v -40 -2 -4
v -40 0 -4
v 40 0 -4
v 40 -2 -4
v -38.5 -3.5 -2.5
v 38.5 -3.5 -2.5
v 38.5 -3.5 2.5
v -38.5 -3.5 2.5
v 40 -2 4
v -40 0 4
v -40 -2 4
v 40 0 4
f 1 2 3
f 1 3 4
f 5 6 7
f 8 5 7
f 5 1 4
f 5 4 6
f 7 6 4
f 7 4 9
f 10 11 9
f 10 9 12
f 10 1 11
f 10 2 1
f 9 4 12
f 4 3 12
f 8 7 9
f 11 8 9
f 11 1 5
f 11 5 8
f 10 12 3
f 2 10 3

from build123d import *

# Parameters (mm, degrees)
BOSS_EXTRU_1_DEPTH      = 40
BOSS_EXTRU_1_DEPTH_BACK = 40
CHANFREIN1_SIZE         = 1.5


with BuildPart() as part:
    # Esquisse1 → Boss.-Extru.1 (new, two sides: drawn at the far end of the back side and taken through both)
    with BuildSketch(Plane(origin=(0, 0, 0), x_dir=(0, 0, -1), z_dir=(1, 0, 0)).offset(-BOSS_EXTRU_1_DEPTH_BACK)):
        Polygon((-4, 0), (4, 0), (4, -2), (2.5, -3.5), (-2.5, -3.5), (-4, -2), align=None)
    extrude(amount=BOSS_EXTRU_1_DEPTH + BOSS_EXTRU_1_DEPTH_BACK)

    # Chanfrein1
    chanfrein1_edges = [part.edges().sort_by_distance(p)[0] for p in [
        (40, -3.5, 0),
        (-40, -3.5, 0),
    ]]
    chamfer(chanfrein1_edges, length=CHANFREIN1_SIZE)


solid = part.part
